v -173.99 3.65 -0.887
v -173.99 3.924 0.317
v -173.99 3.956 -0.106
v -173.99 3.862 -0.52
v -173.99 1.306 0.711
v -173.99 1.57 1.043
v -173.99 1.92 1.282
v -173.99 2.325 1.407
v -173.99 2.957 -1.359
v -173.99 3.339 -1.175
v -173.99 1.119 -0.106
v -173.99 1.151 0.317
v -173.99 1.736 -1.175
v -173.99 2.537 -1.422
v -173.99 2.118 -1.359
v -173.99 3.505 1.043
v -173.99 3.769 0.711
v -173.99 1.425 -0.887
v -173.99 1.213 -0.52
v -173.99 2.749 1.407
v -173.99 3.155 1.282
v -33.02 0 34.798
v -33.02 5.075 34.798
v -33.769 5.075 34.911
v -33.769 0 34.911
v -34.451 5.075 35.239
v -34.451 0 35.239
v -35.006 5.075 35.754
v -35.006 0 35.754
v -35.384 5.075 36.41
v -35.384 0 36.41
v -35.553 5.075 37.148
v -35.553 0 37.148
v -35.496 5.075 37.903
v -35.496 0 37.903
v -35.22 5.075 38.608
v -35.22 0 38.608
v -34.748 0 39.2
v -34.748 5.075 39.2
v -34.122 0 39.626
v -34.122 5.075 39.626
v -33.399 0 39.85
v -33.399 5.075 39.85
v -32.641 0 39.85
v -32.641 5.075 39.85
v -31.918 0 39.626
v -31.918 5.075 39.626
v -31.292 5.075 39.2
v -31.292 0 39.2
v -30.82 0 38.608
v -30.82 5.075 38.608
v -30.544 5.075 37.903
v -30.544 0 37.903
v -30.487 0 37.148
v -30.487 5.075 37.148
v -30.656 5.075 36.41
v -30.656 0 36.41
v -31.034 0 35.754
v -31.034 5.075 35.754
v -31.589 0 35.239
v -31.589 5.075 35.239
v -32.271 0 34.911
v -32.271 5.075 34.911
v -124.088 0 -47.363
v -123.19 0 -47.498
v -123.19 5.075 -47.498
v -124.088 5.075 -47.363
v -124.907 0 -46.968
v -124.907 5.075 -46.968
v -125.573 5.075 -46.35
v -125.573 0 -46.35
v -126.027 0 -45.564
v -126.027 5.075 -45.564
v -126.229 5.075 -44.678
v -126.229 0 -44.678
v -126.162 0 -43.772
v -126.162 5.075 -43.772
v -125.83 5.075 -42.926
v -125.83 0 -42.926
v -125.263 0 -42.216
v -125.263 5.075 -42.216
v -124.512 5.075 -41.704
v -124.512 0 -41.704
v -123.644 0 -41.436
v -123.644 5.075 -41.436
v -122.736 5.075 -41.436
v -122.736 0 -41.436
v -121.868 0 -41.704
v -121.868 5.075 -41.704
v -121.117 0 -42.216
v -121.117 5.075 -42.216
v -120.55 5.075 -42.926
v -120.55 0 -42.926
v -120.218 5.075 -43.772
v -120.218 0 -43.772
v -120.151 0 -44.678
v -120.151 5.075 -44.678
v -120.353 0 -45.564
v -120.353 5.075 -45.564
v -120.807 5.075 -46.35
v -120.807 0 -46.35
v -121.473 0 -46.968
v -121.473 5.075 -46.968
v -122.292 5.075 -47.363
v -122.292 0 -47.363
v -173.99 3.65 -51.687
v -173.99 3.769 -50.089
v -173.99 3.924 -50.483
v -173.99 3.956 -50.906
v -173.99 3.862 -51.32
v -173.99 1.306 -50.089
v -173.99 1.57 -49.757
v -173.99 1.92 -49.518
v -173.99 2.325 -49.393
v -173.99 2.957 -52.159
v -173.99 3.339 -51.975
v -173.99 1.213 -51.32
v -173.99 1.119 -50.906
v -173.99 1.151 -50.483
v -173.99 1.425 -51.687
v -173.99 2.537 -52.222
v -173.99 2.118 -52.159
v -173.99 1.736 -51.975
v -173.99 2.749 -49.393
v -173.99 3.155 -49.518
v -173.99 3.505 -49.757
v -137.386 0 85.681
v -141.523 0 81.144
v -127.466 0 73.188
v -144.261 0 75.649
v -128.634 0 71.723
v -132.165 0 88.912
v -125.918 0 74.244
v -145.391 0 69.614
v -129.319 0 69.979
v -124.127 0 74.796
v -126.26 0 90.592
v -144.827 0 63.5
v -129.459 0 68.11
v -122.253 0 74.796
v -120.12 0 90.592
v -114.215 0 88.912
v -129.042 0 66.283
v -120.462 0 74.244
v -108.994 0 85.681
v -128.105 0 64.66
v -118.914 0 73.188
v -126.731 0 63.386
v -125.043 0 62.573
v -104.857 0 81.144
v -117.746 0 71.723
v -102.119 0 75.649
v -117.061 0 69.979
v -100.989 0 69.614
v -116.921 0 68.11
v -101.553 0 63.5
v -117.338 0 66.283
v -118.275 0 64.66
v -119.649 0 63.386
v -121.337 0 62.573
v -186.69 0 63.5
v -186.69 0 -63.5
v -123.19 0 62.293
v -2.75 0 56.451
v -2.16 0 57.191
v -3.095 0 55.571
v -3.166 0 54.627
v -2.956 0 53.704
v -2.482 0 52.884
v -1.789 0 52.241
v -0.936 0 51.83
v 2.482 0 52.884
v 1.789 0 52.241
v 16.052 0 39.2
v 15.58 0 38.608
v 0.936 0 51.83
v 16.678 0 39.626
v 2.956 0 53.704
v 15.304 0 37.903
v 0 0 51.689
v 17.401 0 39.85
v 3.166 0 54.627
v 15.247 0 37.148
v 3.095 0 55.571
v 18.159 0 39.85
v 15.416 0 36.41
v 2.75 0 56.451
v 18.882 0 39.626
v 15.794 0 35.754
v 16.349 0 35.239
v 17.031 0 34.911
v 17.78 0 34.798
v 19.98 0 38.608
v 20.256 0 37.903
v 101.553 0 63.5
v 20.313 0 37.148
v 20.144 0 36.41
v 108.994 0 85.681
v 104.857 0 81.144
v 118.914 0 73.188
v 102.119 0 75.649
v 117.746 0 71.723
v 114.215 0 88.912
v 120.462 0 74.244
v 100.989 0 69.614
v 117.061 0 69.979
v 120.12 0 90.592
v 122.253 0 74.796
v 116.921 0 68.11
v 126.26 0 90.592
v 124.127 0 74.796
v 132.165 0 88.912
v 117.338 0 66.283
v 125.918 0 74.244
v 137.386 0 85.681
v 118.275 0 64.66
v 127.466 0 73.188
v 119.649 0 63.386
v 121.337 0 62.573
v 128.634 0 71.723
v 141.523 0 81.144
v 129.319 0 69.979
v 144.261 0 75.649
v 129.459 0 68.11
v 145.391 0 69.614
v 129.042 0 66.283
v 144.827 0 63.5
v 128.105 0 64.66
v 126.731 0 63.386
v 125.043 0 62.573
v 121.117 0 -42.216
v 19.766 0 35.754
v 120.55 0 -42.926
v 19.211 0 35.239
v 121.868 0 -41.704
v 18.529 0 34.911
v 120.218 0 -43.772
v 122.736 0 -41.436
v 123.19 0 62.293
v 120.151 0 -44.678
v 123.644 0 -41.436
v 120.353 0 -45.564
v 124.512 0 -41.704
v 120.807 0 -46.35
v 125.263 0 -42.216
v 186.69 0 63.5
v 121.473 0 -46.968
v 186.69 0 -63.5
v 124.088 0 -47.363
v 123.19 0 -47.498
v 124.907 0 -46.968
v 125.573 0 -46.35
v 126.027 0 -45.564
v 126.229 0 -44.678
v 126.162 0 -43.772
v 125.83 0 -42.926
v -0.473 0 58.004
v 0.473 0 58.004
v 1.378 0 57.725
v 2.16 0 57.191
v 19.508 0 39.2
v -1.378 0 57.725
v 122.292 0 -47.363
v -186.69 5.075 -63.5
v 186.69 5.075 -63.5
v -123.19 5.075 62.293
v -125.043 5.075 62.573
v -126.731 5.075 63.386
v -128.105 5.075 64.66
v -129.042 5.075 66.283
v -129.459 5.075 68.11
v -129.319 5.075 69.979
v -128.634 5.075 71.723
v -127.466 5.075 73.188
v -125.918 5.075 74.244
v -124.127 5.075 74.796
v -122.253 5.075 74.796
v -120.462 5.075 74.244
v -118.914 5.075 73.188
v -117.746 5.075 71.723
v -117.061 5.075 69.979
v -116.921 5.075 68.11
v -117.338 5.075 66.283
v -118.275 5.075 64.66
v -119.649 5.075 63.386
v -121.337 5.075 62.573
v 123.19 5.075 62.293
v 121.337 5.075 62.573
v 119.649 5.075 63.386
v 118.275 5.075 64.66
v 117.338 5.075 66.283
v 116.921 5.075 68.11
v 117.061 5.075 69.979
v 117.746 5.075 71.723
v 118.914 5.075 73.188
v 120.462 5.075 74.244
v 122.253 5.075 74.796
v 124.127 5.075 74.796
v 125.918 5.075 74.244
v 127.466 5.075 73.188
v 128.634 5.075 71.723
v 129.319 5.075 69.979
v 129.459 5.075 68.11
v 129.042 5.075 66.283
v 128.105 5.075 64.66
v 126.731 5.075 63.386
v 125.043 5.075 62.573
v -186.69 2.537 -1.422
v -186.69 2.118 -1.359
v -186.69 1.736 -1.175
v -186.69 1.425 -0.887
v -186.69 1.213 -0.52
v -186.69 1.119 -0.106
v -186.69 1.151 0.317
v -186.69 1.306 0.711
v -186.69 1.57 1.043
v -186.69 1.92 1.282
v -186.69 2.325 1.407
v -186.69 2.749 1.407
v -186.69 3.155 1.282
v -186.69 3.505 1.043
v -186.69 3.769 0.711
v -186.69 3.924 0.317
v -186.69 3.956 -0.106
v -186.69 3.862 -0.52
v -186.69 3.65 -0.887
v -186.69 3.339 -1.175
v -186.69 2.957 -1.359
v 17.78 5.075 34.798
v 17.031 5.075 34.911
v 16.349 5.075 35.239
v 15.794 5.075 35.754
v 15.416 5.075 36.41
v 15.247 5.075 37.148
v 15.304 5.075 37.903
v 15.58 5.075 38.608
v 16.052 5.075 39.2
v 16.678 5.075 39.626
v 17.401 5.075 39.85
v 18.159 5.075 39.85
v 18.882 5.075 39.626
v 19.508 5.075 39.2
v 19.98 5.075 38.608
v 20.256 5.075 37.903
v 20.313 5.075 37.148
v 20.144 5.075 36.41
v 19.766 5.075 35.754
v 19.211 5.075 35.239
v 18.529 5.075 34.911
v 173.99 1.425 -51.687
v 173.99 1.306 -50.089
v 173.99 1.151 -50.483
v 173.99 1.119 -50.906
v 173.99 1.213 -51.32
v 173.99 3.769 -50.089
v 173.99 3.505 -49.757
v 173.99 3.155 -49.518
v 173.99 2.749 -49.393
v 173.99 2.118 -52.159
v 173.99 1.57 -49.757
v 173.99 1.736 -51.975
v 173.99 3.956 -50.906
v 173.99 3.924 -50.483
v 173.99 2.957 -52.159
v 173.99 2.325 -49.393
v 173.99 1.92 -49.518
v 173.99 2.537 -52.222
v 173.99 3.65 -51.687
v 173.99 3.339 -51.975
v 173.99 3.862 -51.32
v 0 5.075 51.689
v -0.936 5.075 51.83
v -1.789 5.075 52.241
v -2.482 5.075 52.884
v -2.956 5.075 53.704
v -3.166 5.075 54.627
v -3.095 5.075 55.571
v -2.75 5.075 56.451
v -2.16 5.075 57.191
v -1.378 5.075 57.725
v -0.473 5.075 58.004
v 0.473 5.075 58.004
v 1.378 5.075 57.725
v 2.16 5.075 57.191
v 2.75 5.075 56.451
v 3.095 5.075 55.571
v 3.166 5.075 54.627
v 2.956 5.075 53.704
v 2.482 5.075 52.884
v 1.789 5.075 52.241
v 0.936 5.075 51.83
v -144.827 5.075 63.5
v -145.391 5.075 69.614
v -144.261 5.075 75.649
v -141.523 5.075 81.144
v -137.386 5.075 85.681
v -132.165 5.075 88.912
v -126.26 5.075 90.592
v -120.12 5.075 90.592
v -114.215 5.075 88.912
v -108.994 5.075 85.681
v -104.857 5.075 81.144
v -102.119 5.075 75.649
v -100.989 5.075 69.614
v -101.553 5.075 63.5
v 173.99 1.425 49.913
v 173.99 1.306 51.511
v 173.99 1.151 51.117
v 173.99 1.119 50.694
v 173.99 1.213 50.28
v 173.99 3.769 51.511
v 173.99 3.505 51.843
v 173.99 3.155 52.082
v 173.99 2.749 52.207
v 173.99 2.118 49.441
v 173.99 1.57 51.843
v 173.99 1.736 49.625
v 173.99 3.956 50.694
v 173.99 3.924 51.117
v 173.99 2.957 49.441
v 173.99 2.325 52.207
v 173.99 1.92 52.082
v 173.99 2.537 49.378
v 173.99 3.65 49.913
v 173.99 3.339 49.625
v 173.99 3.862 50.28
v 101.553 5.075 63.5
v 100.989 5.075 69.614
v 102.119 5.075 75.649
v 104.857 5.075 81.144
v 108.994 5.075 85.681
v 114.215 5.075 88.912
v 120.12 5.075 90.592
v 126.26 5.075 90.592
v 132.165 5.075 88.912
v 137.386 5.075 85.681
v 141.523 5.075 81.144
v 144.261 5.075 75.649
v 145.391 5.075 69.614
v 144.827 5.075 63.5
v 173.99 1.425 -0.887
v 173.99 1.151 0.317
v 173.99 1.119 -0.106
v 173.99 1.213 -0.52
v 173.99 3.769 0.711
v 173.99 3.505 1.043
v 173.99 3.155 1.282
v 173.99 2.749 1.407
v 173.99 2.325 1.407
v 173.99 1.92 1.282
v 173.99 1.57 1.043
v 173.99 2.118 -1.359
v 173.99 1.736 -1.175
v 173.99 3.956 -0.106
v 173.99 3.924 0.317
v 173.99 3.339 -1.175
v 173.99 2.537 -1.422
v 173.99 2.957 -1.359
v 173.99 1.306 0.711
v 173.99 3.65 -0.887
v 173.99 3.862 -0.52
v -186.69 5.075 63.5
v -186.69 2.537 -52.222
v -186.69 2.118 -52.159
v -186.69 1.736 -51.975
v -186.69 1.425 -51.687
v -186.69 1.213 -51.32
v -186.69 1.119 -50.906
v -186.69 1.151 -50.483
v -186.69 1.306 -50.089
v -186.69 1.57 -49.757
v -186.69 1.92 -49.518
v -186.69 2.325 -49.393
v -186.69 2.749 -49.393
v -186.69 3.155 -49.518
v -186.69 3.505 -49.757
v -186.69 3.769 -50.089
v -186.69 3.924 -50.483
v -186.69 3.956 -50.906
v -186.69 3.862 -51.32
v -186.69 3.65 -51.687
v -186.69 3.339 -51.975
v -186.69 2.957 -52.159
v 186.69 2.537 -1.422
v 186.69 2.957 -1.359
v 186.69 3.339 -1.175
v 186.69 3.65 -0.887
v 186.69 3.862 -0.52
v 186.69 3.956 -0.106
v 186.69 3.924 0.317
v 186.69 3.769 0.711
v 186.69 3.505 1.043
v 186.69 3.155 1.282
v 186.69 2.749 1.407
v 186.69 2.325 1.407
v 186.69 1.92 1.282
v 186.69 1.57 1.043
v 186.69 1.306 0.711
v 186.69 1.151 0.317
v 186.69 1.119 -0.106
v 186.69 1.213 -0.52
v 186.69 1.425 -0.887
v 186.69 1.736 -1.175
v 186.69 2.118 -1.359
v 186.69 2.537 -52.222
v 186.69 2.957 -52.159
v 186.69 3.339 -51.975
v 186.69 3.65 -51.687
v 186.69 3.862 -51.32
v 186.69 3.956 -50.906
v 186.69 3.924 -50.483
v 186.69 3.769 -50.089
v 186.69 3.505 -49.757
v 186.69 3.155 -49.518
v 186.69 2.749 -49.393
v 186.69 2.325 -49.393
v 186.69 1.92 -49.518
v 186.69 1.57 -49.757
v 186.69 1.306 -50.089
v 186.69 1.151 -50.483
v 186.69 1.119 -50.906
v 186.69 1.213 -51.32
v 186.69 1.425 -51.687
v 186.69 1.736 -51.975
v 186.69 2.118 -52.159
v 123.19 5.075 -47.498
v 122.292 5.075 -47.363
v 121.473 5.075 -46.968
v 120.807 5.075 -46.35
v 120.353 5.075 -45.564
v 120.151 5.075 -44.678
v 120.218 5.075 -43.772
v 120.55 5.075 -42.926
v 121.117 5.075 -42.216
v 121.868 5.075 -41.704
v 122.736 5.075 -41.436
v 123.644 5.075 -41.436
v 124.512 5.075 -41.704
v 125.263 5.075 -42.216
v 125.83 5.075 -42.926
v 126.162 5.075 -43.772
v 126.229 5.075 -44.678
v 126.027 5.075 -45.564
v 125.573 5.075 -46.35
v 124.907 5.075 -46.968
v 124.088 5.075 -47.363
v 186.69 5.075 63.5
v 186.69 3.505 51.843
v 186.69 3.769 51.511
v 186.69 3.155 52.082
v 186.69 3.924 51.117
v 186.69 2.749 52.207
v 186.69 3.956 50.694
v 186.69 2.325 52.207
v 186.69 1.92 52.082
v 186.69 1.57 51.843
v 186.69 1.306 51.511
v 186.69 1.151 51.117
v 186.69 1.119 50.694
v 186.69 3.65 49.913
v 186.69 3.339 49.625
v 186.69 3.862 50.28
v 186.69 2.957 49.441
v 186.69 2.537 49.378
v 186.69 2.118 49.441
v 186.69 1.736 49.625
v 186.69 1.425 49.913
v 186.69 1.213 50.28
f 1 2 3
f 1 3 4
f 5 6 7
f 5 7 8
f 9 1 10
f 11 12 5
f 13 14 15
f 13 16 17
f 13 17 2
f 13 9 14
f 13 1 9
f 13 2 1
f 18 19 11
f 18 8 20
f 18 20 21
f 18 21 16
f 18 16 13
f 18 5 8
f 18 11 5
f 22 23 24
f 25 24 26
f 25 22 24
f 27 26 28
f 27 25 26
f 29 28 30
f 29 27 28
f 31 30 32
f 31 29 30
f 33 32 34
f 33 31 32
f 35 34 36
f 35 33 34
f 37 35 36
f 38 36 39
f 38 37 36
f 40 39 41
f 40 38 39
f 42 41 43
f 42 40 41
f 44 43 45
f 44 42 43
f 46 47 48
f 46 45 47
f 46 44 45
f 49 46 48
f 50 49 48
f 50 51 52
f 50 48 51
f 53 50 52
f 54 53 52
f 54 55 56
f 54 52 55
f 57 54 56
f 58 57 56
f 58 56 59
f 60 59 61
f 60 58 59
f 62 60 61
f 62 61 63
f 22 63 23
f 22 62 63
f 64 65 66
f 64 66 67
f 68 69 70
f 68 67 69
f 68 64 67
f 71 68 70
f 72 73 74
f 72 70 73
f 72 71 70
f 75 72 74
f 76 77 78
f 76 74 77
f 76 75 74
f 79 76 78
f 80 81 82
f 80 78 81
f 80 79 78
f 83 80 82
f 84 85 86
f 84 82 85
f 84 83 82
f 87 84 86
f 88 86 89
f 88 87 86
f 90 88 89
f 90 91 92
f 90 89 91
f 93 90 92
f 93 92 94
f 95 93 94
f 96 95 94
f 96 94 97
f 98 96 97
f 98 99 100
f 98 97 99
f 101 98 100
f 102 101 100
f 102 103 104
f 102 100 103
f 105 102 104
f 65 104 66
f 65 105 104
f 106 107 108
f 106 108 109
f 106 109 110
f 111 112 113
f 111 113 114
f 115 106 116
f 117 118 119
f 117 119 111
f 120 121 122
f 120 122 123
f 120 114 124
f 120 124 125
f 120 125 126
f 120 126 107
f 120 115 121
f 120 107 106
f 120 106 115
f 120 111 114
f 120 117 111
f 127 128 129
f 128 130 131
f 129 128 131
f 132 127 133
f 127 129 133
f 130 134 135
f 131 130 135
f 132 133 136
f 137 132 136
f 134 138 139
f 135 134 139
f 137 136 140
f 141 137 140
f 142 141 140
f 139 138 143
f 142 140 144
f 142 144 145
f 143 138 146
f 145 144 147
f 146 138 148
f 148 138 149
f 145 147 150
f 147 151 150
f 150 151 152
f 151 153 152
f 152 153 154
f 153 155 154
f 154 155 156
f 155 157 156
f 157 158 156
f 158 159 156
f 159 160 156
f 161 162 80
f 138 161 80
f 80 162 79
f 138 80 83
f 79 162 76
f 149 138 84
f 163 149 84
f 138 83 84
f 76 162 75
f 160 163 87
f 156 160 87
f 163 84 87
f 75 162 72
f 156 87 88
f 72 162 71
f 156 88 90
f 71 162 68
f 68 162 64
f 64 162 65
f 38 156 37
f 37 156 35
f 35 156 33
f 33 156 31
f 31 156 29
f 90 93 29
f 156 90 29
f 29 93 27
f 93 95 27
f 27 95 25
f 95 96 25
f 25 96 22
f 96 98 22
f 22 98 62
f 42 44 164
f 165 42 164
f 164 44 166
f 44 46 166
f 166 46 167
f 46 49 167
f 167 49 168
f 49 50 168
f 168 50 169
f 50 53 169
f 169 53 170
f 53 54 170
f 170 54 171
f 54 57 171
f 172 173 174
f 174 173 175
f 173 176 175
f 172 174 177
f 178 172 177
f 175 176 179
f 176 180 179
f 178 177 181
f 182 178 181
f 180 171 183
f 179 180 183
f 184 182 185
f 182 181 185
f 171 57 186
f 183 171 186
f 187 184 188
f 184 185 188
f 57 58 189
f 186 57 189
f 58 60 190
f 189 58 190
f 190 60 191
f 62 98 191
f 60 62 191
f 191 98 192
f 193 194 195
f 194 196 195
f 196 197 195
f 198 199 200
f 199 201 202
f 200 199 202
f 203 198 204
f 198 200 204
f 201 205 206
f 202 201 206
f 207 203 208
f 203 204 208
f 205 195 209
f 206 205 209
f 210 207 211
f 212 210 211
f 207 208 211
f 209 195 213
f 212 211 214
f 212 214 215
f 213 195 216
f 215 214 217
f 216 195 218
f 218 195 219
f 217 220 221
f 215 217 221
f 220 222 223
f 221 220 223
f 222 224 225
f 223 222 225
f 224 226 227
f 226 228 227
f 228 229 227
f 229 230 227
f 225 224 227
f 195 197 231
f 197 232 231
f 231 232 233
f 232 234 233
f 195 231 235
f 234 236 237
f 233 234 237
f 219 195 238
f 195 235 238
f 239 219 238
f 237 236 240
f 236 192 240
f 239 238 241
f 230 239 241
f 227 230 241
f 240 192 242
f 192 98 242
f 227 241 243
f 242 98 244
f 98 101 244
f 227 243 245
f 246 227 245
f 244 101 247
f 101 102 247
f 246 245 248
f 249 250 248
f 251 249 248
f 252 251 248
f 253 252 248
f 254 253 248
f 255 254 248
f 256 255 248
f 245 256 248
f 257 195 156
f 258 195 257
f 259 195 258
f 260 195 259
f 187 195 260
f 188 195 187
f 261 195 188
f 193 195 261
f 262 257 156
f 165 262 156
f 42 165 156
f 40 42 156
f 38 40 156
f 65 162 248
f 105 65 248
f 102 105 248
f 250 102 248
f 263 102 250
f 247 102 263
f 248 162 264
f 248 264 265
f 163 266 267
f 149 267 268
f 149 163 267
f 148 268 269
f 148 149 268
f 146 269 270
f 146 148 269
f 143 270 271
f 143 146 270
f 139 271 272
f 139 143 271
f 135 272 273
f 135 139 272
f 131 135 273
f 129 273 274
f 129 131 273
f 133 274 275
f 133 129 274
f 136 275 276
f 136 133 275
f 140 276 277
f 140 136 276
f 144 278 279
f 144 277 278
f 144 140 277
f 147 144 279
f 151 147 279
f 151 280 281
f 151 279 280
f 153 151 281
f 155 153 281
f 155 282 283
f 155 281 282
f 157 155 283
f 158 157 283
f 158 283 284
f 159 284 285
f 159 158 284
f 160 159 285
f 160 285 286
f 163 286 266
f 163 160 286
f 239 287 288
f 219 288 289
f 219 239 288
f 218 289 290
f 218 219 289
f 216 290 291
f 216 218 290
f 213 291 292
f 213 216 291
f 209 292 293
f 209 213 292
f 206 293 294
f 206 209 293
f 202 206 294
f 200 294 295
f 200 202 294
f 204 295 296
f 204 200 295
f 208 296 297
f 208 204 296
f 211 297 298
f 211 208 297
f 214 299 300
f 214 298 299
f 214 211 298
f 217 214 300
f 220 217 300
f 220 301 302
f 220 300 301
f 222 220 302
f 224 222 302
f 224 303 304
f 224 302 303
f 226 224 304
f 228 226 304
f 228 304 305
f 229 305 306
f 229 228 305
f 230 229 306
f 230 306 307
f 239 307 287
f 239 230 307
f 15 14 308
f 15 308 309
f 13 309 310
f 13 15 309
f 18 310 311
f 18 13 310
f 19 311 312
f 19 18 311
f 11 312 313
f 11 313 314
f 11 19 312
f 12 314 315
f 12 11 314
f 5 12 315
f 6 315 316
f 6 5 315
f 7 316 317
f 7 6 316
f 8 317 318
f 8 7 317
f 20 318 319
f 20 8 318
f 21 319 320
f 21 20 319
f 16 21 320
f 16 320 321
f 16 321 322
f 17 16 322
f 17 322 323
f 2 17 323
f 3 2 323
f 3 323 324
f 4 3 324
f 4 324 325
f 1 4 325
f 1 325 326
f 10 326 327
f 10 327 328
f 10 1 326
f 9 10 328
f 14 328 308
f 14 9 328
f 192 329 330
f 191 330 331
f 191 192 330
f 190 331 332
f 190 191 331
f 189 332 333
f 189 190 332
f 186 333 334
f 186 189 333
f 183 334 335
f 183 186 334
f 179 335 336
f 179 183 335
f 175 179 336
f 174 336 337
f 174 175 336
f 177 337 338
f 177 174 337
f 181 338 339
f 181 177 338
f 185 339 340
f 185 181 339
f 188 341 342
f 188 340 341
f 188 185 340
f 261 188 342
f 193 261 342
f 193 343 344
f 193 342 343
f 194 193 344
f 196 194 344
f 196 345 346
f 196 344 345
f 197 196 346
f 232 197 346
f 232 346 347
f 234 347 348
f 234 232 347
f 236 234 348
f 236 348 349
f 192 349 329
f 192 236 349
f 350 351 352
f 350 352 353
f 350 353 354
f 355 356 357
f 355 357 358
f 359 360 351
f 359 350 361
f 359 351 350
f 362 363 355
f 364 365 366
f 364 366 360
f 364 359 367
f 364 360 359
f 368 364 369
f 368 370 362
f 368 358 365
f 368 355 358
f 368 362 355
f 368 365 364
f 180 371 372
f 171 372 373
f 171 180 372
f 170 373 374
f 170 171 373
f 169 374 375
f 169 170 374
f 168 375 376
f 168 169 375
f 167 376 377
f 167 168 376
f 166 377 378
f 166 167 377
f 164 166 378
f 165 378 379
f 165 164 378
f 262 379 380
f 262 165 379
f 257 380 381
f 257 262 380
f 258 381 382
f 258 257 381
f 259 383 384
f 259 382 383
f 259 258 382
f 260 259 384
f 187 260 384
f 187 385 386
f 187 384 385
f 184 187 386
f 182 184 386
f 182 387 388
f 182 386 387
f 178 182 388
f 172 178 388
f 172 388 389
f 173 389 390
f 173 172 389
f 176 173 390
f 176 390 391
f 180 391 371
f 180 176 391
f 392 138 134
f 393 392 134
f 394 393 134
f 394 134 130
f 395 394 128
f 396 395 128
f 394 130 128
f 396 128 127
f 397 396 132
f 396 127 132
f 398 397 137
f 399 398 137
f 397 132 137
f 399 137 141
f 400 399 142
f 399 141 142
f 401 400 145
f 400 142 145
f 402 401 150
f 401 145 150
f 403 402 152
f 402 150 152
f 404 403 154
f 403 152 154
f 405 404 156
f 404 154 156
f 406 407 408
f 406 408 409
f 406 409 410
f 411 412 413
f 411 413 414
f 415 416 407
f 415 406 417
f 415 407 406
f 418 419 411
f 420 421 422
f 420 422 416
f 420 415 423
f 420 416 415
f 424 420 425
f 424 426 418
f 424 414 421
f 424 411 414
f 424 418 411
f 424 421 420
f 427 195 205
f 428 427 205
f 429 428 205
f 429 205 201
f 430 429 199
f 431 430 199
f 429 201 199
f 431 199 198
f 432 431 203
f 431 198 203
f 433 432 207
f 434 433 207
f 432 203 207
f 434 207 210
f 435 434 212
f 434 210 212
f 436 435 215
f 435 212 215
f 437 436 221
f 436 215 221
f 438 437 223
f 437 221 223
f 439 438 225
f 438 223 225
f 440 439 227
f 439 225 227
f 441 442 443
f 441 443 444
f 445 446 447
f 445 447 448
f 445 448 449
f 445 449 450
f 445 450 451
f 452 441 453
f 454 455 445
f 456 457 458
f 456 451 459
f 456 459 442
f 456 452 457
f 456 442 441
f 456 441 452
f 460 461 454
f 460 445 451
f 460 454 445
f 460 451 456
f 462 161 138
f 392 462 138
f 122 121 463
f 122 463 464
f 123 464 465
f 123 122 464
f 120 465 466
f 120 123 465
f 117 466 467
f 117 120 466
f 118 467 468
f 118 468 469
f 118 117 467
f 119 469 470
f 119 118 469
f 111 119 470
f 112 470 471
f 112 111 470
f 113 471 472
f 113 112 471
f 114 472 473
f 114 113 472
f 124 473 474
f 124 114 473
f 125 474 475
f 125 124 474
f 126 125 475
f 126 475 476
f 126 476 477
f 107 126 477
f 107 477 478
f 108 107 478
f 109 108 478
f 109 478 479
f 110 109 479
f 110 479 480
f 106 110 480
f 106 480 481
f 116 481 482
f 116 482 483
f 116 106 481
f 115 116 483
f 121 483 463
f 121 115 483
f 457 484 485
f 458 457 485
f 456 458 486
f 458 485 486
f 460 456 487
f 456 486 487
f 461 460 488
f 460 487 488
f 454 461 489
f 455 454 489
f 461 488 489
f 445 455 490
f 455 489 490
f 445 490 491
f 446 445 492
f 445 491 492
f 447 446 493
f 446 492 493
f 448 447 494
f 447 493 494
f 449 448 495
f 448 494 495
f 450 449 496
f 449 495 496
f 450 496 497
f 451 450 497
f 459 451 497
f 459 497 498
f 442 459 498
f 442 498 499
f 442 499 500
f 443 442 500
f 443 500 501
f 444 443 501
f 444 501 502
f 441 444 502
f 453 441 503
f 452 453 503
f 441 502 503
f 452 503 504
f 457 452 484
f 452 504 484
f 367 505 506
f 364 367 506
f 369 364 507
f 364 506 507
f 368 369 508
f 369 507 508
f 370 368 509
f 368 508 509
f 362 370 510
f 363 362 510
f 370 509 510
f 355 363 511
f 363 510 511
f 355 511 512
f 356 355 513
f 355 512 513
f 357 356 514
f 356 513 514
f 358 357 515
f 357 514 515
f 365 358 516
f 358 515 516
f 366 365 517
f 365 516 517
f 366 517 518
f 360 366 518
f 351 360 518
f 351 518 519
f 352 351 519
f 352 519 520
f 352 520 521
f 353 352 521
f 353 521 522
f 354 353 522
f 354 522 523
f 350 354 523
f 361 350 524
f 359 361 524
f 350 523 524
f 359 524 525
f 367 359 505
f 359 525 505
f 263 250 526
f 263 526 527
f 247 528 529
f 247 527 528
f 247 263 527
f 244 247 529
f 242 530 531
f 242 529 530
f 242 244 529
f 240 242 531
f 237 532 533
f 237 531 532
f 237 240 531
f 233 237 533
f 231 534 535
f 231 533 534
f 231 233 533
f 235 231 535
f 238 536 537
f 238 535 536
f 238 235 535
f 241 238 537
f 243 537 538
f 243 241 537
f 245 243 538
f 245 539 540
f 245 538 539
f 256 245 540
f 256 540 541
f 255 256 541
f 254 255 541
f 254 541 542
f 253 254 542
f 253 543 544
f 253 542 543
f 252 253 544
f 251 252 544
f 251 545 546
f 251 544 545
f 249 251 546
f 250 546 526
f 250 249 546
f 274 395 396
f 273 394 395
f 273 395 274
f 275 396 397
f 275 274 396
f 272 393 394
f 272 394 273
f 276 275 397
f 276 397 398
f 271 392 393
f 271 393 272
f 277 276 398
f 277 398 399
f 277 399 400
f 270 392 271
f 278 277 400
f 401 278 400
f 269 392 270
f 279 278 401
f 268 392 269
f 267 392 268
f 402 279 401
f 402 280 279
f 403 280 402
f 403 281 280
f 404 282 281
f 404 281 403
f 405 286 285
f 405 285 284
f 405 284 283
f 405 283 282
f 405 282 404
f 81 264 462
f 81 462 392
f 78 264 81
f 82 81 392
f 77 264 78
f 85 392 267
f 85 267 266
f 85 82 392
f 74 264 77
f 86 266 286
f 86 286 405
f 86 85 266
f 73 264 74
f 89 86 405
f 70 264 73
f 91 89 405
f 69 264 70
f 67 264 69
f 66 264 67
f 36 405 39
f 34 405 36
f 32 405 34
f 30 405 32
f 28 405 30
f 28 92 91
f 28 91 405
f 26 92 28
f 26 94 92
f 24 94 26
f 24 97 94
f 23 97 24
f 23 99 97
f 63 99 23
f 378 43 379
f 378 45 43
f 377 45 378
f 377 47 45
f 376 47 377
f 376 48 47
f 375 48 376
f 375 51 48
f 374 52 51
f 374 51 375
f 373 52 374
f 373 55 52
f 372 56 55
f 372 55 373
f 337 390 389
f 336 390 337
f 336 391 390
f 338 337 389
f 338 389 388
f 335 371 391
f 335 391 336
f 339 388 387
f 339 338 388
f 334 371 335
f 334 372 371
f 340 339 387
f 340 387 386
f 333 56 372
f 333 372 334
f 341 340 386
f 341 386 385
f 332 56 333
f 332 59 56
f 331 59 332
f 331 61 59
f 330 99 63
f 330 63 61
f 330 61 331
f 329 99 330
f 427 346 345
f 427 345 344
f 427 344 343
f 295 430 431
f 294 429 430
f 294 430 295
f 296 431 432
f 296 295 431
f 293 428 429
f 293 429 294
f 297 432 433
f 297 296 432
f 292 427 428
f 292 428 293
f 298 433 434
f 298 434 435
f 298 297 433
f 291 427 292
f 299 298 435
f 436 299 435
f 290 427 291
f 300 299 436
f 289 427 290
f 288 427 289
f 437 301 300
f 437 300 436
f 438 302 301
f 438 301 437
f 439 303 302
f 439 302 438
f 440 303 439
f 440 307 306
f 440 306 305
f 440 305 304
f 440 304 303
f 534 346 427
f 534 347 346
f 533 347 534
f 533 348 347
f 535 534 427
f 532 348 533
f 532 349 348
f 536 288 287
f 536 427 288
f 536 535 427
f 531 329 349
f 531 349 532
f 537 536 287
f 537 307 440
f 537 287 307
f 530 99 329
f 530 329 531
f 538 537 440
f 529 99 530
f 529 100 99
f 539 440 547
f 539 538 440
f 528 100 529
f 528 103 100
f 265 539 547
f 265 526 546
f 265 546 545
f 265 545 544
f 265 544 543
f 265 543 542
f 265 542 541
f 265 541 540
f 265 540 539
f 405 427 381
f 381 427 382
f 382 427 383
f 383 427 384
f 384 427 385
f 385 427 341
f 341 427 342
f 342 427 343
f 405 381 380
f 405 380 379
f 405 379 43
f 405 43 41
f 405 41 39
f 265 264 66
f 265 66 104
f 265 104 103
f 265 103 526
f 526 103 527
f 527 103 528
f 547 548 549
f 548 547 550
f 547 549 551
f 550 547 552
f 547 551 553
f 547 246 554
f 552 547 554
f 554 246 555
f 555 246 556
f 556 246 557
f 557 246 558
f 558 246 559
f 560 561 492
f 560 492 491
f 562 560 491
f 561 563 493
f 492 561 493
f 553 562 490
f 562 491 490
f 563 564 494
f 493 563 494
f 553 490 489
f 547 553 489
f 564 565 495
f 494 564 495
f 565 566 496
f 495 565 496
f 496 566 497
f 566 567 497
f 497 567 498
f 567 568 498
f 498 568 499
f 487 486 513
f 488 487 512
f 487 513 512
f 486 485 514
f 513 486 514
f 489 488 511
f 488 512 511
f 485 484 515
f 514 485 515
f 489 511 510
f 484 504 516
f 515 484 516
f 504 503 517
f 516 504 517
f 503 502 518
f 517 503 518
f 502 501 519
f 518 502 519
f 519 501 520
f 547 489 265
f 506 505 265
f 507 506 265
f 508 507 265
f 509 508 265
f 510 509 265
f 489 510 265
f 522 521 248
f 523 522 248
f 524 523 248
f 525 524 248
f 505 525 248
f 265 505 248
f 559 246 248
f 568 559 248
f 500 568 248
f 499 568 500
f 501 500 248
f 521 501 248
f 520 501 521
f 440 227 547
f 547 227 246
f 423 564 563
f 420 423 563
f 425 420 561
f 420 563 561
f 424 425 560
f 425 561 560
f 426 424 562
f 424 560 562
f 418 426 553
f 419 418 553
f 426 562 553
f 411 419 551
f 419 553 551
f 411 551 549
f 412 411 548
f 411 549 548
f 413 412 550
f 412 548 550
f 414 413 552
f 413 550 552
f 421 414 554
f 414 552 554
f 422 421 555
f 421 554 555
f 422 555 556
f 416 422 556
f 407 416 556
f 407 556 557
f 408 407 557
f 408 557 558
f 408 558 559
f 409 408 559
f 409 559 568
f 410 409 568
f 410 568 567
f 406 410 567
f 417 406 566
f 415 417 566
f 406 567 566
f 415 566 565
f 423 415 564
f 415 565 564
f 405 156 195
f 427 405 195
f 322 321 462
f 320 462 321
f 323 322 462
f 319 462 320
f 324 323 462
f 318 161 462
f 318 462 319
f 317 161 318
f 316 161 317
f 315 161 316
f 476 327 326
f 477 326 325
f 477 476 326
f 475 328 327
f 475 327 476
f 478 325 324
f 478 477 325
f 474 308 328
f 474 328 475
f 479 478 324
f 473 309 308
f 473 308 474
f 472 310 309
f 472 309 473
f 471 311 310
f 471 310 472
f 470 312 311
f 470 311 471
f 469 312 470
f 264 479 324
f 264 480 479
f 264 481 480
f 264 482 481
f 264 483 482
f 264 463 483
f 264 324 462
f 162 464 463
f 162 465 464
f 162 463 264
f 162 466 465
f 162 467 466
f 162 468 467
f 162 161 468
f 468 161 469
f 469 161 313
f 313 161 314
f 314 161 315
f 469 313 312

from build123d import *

# Parameters (mm, degrees)
BOSS_EXTRUDE1_DEPTH     = 5.07492
SKETCH1_5_R             = 6.2865
CUT_EXTRUDE1_DEPTH      = 208.664293845
CUT_EXTRUDE2_DEPTH      = 208.664293845
CUT_EXTRUDE2_DEPTH_BACK = 208.664293845
SKETCH1_7_R             = 3.048
SKETCH1_8_R             = 2.54
SKETCH1_8_R_2           = 3.175
CUT_EXTRUDE3_DEPTH      = 208.664293845
SKETCH2_R               = 1.4224
CUT_EXTRUDE4_DEPTH      = 12.7
CUT_EXTRUDE5_START      = -12.7
SKETCH3_R               = 1.4224
CUT_EXTRUDE5_DEPTH      = 12.7


with BuildPart() as part:
    # Sketch1 → Boss-Extrude1 (new body)
    with BuildSketch(Plane(origin=(0, 0, 0), x_dir=(1, 0, 0), z_dir=(0, 1, 0))):
        with BuildLine():
            Line((-186.69, 63.5), (-186.69, -63.5))
            Line((-186.69, -63.5), (-144.826640797, -63.5))
            ThreePointArc((-144.826640797, -63.5), (-123.19, -90.805), (-101.553359203, -63.5))
            Line((-101.553359203, -63.5), (101.553359203, -63.5))
            ThreePointArc((101.553359203, -63.5), (123.19, -90.805), (144.826640797, -63.5))
            Line((144.826640797, -63.5), (186.69, -63.5))
            Line((186.69, -63.5), (186.69, 63.5))
            Line((186.69, 63.5), (-186.69, 63.5))
        make_face()
    extrude(amount=BOSS_EXTRUDE1_DEPTH)

    # Sketch1<5> → Cut-Extrude1 (cut, through all)
    with BuildSketch(Plane(origin=(0, 0, 0), x_dir=(1, 0, 0), z_dir=(0, 1, 0))):
        with Locations((-123.19, -68.58)):
            Circle(SKETCH1_5_R)
        with Locations((123.19, -68.58)):
            Circle(SKETCH1_5_R)
    extrude(amount=CUT_EXTRUDE1_DEPTH, mode=Mode.SUBTRACT)

    # Sketch1<7> → Cut-Extrude2 (cut, two sides: drawn at the far end of the back side and taken through both)
    with BuildSketch(Plane(origin=(0, 0, 0), x_dir=(1, 0, 0), z_dir=(0, 1, 0)).offset(-CUT_EXTRUDE2_DEPTH_BACK)):
        with Locations((-123.19, 44.45)):
            Circle(SKETCH1_7_R)
        with Locations((123.19, 44.45)):
            Circle(SKETCH1_7_R)
    extrude(amount=CUT_EXTRUDE2_DEPTH + CUT_EXTRUDE2_DEPTH_BACK, mode=Mode.SUBTRACT)

    # Sketch1<8> → Cut-Extrude3 (cut, through all)
    with BuildSketch(Plane(origin=(0, 0, 0), x_dir=(1, 0, 0), z_dir=(0, 1, 0))):
        with Locations((-33.02, -37.338)):
            Circle(SKETCH1_8_R)
        with Locations((17.78, -37.338)):
            Circle(SKETCH1_8_R)
        with Locations((0, -54.864)):
            Circle(SKETCH1_8_R_2)
    extrude(amount=CUT_EXTRUDE3_DEPTH, mode=Mode.SUBTRACT)

    # Sketch2 → Cut-Extrude4 (cut)
    with BuildSketch(Plane(origin=(186.69, 0, 0), x_dir=(0, 0, -1), z_dir=(1, 0, 0))):
        with Locations((0, 2.53746)):
            Circle(SKETCH2_R)
        with Locations((-50.8, 2.53746)):
            Circle(SKETCH2_R)
        with Locations((50.8, 2.53746)):
            Circle(SKETCH2_R)
    extrude(amount=-CUT_EXTRUDE4_DEPTH, mode=Mode.SUBTRACT)

    # Sketch3 → Cut-Extrude5 (cut)
    with BuildSketch(Plane.ZY.offset(186.69).offset(CUT_EXTRUDE5_START)):
        with Locations((-50.8, 2.53746)):
            Circle(SKETCH3_R)
        with Locations((0, 2.53746)):
            Circle(SKETCH3_R)
    extrude(amount=CUT_EXTRUDE5_DEPTH, mode=Mode.SUBTRACT)


solid = part.part
